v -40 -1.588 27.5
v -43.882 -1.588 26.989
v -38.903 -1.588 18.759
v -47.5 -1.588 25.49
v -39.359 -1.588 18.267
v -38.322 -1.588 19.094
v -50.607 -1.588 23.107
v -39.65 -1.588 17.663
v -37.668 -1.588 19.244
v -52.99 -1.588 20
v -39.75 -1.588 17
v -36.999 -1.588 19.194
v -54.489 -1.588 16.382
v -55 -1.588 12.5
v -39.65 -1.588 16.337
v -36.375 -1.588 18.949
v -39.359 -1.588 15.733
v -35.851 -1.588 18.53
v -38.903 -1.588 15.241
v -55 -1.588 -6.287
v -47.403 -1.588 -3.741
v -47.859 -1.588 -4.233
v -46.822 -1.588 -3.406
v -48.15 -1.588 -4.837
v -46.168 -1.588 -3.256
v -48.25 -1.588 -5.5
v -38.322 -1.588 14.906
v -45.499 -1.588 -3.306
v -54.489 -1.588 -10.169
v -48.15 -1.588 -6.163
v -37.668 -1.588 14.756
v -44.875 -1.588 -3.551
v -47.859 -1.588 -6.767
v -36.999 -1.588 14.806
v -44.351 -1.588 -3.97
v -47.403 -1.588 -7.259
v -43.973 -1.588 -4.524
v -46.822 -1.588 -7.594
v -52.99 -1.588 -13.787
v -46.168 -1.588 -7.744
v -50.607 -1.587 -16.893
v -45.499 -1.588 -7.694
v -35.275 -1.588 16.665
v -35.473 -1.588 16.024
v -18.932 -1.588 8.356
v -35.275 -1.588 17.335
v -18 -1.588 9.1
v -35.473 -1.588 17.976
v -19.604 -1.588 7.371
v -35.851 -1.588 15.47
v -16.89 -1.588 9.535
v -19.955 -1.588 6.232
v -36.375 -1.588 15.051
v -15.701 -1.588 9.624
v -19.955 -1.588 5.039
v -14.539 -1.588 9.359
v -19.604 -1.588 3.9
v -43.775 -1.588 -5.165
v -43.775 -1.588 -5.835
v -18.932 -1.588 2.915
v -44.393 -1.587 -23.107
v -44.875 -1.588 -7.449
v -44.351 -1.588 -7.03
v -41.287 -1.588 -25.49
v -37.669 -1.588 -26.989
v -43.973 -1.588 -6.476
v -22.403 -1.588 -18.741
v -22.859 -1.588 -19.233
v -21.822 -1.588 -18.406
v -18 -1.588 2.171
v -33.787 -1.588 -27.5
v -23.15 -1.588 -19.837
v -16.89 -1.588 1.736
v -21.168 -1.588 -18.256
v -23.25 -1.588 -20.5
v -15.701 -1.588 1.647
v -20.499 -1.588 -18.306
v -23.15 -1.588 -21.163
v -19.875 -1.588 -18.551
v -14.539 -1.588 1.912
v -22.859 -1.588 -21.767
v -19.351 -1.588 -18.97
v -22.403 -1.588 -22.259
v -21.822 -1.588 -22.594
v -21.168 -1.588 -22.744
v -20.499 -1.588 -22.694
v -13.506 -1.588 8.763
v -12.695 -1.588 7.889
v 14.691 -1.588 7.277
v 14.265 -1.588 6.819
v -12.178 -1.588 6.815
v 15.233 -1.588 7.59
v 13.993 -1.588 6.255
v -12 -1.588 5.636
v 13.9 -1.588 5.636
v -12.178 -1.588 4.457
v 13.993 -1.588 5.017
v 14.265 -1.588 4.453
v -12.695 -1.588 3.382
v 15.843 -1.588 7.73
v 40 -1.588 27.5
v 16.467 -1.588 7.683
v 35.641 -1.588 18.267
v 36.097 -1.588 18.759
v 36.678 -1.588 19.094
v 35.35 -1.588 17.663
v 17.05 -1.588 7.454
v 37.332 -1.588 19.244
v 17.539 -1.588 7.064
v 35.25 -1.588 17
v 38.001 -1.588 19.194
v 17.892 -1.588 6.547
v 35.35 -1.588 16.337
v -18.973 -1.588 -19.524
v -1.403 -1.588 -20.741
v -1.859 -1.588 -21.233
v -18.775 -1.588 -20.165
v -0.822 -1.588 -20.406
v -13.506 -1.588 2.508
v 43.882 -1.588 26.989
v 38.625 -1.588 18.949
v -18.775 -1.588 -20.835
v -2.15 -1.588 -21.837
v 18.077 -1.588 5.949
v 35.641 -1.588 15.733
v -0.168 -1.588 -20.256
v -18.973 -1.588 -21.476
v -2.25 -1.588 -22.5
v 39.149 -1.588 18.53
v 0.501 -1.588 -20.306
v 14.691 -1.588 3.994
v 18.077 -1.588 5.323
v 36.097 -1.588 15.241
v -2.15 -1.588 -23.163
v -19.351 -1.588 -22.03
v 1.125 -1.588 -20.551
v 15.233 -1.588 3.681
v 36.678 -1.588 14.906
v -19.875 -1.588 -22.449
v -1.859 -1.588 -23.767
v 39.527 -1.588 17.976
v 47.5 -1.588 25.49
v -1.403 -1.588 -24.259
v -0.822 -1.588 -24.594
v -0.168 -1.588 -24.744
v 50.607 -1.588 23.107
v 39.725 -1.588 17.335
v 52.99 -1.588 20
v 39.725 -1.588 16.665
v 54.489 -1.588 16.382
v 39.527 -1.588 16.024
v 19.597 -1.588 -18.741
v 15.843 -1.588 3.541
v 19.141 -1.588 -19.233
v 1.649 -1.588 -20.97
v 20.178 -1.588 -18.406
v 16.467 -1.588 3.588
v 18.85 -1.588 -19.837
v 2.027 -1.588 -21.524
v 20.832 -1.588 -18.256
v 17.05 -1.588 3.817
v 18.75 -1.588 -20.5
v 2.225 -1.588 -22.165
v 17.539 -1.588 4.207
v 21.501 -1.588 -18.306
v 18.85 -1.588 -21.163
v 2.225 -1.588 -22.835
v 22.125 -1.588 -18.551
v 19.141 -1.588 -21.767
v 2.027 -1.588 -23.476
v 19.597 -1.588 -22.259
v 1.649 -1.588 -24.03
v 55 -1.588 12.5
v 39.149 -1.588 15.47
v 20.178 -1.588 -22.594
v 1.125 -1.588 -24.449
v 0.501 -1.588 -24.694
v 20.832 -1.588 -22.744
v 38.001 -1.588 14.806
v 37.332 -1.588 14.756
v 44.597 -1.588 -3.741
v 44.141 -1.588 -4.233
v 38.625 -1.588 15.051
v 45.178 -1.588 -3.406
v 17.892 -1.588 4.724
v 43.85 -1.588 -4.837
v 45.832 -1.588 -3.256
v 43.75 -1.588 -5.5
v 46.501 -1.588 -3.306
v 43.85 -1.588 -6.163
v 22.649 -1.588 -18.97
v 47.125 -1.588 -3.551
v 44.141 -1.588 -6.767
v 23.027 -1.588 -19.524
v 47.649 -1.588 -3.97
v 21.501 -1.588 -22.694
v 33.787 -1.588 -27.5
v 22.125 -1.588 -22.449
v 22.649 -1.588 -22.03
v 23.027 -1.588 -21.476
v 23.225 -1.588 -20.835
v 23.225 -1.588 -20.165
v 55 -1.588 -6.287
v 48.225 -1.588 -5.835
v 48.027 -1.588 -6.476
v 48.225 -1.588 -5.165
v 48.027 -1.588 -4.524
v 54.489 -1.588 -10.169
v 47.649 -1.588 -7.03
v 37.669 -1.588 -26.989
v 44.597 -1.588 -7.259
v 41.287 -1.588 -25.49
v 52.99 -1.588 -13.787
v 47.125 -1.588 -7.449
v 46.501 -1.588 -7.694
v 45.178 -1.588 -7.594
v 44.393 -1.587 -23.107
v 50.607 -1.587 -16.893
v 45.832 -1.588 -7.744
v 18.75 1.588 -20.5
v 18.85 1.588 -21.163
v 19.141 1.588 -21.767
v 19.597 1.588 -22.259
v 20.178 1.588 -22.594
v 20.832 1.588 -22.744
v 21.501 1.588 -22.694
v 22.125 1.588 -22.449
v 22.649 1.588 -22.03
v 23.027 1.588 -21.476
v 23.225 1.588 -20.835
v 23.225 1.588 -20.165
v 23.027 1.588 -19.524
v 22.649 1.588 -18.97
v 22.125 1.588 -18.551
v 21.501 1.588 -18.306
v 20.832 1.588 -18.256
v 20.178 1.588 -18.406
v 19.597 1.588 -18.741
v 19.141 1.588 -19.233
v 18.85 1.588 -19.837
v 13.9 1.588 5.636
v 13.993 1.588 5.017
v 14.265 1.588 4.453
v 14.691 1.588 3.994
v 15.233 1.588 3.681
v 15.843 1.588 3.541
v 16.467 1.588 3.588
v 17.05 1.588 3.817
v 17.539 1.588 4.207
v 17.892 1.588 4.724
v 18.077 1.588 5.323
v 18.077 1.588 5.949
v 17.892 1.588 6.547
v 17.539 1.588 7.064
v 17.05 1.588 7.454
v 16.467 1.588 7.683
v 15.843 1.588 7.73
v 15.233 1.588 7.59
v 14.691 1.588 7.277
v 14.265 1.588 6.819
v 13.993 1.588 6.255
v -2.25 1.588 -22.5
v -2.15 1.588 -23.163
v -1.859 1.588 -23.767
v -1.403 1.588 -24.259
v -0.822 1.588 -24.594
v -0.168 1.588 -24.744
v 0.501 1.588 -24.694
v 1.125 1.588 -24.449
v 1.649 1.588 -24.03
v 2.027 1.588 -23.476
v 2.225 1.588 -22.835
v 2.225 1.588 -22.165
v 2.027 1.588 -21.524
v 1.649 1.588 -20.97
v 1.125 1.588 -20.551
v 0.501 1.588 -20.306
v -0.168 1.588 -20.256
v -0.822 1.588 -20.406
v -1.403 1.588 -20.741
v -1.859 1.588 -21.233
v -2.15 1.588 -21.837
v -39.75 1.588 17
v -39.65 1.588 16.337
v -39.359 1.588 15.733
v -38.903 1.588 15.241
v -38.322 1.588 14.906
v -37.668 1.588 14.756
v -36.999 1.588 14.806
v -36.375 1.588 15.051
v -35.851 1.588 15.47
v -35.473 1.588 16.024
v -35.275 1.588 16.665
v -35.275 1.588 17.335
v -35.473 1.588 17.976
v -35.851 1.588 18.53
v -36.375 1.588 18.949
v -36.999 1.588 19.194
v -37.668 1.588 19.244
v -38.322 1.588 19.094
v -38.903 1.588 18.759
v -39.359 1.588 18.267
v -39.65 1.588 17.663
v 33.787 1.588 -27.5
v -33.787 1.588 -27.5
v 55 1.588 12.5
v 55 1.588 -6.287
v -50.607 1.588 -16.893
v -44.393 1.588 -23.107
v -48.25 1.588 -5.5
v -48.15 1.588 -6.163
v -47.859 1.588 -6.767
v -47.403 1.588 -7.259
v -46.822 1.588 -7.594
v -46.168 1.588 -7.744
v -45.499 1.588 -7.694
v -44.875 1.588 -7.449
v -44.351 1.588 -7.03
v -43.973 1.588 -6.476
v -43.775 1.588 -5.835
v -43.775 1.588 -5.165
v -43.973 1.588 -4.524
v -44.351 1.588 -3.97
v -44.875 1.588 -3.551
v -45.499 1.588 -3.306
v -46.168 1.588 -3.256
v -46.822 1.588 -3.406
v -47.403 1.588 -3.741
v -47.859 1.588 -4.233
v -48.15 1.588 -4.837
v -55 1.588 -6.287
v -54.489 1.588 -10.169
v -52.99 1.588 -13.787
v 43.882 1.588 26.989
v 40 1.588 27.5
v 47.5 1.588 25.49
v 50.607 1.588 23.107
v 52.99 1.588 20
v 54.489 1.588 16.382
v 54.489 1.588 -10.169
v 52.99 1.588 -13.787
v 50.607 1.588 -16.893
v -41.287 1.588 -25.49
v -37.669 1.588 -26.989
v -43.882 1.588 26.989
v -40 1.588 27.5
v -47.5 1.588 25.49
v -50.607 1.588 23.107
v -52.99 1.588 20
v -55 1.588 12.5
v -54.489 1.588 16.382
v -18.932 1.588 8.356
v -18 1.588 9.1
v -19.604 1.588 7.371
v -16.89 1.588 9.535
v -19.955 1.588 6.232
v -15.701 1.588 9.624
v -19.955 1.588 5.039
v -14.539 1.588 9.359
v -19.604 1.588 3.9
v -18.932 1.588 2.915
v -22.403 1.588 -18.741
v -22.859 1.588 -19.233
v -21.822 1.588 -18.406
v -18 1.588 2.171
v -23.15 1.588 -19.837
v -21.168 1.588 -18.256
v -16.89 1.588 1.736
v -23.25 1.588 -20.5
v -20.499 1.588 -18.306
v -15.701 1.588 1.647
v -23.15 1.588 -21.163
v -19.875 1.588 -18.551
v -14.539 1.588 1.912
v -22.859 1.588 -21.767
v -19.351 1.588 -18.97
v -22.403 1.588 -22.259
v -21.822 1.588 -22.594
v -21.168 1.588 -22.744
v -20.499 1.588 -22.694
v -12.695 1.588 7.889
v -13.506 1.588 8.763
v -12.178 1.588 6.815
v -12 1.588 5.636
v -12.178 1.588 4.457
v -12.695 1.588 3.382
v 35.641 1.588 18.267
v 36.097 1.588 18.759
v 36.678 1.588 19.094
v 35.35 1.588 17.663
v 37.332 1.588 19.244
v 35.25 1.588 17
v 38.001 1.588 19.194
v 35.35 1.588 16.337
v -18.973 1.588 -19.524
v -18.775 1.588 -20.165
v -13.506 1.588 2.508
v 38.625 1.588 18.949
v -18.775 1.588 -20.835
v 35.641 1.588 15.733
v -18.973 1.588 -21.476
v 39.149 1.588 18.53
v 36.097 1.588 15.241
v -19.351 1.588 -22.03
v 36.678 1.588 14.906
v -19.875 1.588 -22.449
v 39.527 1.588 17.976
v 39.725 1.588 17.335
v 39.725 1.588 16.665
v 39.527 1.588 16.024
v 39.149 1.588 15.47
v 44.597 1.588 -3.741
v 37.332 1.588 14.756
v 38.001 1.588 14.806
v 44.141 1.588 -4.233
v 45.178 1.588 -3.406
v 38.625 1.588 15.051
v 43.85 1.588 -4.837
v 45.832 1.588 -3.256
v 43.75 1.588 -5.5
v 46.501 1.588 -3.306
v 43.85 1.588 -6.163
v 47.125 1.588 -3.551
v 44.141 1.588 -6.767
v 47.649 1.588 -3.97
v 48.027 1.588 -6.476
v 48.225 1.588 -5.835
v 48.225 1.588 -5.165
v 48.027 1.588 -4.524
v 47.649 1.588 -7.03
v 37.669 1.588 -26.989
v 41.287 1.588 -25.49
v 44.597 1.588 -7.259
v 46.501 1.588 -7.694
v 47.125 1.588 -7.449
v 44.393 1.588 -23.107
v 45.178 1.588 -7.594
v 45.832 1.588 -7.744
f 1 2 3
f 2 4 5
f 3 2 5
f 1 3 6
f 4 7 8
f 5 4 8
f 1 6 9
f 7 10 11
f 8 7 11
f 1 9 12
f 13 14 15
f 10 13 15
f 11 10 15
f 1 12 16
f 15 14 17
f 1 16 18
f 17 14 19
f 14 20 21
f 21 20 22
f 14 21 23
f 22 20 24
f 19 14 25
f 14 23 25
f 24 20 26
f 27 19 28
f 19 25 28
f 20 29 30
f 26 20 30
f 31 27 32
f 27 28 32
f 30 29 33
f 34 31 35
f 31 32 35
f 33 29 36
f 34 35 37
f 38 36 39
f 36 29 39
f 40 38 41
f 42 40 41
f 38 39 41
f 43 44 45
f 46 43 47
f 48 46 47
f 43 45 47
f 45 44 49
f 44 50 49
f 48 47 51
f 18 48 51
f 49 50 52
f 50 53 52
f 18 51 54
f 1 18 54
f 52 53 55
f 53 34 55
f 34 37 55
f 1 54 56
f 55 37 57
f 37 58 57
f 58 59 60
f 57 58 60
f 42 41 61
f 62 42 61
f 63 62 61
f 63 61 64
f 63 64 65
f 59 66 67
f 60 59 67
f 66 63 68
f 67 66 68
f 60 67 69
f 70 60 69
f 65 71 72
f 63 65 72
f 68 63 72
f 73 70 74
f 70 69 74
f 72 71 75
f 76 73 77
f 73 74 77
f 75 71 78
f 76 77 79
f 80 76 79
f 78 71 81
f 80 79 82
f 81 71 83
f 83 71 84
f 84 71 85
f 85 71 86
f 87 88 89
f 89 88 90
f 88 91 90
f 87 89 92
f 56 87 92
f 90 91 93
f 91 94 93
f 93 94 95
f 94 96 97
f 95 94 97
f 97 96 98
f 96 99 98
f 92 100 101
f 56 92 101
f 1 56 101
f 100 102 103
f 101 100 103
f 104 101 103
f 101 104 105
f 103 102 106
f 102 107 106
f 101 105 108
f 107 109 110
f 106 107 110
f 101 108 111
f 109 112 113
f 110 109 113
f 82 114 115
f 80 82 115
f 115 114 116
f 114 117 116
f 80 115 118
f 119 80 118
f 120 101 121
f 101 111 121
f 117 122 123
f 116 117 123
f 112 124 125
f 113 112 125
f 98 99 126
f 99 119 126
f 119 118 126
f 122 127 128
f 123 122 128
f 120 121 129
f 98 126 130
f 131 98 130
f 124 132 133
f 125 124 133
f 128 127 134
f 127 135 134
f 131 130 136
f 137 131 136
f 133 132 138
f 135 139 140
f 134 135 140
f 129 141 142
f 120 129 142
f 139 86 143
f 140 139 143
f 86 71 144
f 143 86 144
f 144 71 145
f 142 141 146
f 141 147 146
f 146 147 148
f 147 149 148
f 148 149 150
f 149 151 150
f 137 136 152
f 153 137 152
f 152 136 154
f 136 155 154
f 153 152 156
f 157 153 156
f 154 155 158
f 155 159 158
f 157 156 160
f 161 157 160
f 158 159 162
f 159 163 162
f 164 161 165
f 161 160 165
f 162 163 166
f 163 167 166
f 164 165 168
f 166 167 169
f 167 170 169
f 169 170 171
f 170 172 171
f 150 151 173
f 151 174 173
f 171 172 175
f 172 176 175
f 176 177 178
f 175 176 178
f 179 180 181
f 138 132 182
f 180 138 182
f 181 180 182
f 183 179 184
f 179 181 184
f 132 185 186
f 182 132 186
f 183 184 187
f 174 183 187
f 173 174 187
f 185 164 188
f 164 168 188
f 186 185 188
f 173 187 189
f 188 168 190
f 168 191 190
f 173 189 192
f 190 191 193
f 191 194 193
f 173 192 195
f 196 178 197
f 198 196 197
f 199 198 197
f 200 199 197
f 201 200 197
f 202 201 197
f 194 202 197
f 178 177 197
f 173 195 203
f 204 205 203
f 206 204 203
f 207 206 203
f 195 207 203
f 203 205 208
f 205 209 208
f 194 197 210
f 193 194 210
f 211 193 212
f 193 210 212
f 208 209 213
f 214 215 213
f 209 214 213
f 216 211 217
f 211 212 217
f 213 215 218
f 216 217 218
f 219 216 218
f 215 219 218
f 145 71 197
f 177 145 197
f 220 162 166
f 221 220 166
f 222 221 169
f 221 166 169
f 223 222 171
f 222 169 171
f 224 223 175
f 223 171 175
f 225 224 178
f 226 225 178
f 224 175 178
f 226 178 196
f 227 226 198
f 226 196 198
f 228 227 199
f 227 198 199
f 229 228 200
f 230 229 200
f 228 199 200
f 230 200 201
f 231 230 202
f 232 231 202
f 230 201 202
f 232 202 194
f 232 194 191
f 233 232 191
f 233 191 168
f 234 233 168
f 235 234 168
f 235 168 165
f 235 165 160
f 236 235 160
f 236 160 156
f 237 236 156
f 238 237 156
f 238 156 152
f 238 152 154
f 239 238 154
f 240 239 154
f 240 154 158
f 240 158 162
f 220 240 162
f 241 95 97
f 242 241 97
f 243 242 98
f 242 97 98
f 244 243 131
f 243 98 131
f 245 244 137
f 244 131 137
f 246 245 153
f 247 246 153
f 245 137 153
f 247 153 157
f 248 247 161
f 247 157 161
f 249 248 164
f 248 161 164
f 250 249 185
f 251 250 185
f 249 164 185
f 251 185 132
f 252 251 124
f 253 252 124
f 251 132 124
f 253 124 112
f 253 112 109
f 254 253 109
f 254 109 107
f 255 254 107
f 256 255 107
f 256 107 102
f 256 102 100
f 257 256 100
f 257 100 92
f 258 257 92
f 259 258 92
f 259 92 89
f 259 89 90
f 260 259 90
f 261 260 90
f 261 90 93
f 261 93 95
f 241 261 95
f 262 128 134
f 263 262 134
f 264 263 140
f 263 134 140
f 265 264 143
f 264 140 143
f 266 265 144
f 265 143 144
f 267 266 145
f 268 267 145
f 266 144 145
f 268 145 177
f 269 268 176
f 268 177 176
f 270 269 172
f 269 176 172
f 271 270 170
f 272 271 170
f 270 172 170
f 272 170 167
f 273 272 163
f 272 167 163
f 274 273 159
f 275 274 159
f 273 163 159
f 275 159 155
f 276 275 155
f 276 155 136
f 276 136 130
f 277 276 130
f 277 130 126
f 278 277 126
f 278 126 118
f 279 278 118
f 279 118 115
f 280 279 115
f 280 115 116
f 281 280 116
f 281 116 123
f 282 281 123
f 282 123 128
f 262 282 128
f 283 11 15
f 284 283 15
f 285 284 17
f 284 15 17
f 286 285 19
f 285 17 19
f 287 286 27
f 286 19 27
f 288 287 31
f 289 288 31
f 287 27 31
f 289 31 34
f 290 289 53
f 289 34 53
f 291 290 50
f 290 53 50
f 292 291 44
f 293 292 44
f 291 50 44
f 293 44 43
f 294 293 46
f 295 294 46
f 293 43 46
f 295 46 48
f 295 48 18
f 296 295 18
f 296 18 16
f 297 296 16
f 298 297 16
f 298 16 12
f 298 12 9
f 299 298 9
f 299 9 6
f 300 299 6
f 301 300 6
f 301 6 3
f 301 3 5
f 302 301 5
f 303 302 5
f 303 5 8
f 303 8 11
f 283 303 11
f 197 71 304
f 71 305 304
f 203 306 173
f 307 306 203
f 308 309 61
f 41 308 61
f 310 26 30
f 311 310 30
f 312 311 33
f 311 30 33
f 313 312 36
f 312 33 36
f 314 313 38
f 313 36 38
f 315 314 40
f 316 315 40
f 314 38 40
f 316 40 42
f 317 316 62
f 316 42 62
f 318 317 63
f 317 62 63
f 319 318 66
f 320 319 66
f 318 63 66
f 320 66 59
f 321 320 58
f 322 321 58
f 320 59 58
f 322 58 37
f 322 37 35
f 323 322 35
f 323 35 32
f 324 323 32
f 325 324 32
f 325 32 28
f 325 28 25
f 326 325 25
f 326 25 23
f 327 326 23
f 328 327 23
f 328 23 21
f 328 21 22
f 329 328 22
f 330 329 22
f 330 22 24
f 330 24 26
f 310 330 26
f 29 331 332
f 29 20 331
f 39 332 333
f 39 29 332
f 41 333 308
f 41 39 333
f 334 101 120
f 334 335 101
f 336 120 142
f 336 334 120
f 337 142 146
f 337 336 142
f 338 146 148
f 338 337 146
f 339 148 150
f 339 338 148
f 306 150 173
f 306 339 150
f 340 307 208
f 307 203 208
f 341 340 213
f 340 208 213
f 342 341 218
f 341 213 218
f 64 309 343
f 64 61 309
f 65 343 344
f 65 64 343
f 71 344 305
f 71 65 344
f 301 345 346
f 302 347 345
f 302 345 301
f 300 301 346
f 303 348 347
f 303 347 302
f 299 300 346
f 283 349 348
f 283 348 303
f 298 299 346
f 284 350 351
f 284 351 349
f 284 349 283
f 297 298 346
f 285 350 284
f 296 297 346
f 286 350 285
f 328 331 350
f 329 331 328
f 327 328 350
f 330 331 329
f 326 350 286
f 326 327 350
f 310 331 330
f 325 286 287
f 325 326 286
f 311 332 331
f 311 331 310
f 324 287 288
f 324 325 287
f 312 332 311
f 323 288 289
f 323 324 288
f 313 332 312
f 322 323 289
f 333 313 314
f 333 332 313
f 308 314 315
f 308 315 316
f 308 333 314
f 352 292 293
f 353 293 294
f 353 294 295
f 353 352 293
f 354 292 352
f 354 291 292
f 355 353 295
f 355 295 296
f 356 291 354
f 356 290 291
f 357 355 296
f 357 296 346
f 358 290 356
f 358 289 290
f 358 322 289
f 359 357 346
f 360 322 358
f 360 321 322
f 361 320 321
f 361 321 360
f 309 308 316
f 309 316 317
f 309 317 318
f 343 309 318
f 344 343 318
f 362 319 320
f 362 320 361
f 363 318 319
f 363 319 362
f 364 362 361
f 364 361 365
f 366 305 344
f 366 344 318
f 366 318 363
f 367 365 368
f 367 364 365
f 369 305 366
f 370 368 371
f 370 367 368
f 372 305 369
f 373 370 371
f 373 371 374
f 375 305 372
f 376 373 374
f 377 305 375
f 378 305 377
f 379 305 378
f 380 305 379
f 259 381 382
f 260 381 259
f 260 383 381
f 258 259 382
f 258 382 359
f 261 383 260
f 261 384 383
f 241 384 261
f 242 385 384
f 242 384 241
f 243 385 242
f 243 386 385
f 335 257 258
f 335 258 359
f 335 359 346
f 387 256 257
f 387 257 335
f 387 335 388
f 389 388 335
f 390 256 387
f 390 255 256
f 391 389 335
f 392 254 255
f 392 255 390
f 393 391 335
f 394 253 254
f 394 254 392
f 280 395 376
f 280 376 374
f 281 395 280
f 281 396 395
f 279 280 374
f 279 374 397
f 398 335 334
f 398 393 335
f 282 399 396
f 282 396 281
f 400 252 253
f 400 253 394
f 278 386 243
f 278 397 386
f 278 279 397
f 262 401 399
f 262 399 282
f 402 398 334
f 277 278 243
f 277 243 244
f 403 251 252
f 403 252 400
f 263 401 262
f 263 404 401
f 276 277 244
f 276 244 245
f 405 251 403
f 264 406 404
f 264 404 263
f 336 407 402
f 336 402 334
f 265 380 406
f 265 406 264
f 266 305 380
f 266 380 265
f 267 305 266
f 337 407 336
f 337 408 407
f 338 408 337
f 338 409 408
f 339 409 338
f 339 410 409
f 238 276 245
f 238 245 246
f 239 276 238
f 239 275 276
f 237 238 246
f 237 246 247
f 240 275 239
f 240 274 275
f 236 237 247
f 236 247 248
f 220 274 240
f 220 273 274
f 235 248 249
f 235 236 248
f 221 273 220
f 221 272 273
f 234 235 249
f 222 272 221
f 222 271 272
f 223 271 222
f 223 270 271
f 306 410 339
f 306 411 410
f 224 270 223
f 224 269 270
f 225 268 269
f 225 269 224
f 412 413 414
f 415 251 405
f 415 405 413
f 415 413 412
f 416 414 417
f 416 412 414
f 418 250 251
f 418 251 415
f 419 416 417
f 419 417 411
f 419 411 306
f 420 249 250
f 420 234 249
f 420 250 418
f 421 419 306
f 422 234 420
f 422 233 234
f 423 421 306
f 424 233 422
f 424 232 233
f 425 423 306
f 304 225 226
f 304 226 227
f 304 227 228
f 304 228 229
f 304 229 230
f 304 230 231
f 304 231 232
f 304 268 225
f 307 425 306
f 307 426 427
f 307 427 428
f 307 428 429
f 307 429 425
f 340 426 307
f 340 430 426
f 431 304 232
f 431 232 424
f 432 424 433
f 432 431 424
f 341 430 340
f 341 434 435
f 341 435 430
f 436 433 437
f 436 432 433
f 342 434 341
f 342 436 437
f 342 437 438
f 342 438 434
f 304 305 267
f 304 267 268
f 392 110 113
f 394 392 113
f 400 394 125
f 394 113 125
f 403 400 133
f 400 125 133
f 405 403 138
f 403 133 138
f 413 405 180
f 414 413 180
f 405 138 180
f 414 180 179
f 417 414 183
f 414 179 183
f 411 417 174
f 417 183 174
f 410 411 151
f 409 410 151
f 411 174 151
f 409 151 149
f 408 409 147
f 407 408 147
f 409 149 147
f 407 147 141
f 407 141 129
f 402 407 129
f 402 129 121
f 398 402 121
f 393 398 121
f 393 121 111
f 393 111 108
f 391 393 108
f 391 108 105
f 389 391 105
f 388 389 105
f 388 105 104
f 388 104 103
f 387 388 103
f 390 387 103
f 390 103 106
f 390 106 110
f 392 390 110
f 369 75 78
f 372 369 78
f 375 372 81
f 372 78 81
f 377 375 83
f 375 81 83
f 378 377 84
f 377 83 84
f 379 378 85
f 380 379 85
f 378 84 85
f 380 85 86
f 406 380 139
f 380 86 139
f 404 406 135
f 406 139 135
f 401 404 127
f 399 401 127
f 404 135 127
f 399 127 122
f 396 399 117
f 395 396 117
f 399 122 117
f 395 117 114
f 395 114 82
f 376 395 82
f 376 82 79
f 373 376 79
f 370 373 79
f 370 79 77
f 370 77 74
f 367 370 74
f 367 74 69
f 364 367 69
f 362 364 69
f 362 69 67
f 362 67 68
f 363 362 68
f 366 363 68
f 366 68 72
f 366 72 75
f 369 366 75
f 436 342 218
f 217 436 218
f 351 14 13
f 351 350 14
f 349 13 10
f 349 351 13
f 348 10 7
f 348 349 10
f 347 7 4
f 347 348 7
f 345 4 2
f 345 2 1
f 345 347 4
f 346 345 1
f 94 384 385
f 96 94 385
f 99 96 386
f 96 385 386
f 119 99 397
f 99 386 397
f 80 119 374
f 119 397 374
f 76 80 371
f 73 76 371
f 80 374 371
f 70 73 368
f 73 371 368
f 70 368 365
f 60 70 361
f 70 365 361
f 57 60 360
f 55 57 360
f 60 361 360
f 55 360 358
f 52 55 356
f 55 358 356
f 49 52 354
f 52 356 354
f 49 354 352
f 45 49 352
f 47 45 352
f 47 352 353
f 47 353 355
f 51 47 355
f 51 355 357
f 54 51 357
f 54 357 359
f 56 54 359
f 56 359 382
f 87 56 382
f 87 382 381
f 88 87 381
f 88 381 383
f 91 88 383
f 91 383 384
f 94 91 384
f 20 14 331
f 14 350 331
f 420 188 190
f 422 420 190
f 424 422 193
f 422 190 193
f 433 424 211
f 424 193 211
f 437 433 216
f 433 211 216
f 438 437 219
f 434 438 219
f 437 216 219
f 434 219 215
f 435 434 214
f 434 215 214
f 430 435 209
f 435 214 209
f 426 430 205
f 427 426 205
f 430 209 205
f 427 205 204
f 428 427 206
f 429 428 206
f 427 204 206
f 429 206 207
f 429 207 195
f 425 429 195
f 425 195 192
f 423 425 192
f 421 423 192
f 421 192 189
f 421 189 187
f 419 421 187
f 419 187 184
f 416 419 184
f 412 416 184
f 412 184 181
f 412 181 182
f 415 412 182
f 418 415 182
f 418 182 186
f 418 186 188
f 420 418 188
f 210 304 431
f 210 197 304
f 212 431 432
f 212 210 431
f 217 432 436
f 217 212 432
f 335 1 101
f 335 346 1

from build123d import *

# Parameters (mm, degrees)
SKETCH2_W                = 110
SKETCH2_H                = 55
BOSS_EXTRUDE1_DEPTH      = 1.5875
M4_CLEARANCE_HOLE1_D     = 4.5
M4_CLEARANCE_HOLE2_D     = 4.5
M4_CLEARANCE_HOLE2_DEPTH = 10.1
M4_CLEARANCE_HOLE2_TIP   = 1.351936393
M4_CLEARANCE_HOLE3_D     = 4.5
CHAMFER1_SIZE            = 15
FILLET1_R                = 15
SKETCH9_R                = 4
CUT_EXTRUDE1_DEPTH       = 4.175
M5X0_8_TAPPED_HOLE1_D    = 4.2


with BuildPart() as part:
    # Sketch2 → Boss-Extrude1 (new body, symmetric)
    with BuildSketch(Plane(origin=(0, 0, 0), x_dir=(1, 0, 0), z_dir=(0, 1, 0))):
        Rectangle(SKETCH2_W, SKETCH2_H)
    extrude(amount=BOSS_EXTRUDE1_DEPTH, both=True)

    # M4 Clearance Hole1 (through all)
    with Locations(Plane(origin=(0, 1.5875, 0), x_dir=(1, 0, 0), z_dir=(0, 1, 0))):
        with Locations((-37.5, -17), (37.5, -17)):
            Hole(M4_CLEARANCE_HOLE1_D / 2)

    # M4 Clearance Hole2
    with Locations(Plane(origin=(0, 1.5875, 0), x_dir=(1, 0, 0), z_dir=(0, 1, 0))):
        with Locations((0, 22.5)):
            Hole(M4_CLEARANCE_HOLE2_D / 2, depth=M4_CLEARANCE_HOLE2_DEPTH)
            with Locations((0, 0, -(M4_CLEARANCE_HOLE2_DEPTH + M4_CLEARANCE_HOLE2_TIP / 2))):  # 118° drill point
                Cone(0, M4_CLEARANCE_HOLE2_D / 2, M4_CLEARANCE_HOLE2_TIP, mode=Mode.SUBTRACT)

    # M4 Clearance Hole3 (through all)
    with Locations(Plane(origin=(0, 1.5875, 0), x_dir=(1, 0, 0), z_dir=(0, 1, 0))):
        with Locations((-46, 5.5), (46, 5.5), (21, 20.5), (-21, 20.5)):
            Hole(M4_CLEARANCE_HOLE3_D / 2)

    # Chamfer1
    chamfer1_edges = [part.edges().sort_by_distance(p)[0] for p in [
        (-55, 0, -27.5),
        (55, 0, -27.5),
    ]]
    chamfer(chamfer1_edges, length=CHAMFER1_SIZE)

    # Fillet1
    fillet1_edges = [part.edges().sort_by_distance(p)[0] for p in [
        (-55, 0, -12.5),
        (40, 0, -27.5),
        (-40, 0, -27.5),
        (55, 0, -12.5),
        (55, 0, 27.5),
        (-55, 0, 27.5),
    ]]
    fillet(fillet1_edges, radius=FILLET1_R)

    # Sketch9 → Cut-Extrude1 (cut, through all)
    with BuildSketch(Plane(origin=(0, 1.5875, 0), x_dir=(1, 0, 0), z_dir=(0, 1, 0))):
        with Locations((-16, -5.635528726)):
            Circle(SKETCH9_R)
    extrude(amount=-CUT_EXTRUDE1_DEPTH, mode=Mode.SUBTRACT)

    # M5x0.8 Tapped Hole1 (through all)
    with Locations(Plane(origin=(0, 1.5875, 0), x_dir=(1, 0, 0), z_dir=(0, 1, 0))):
        with Locations((16, -5.635528726)):
            Hole(M5X0_8_TAPPED_HOLE1_D / 2)


solid = part.part
